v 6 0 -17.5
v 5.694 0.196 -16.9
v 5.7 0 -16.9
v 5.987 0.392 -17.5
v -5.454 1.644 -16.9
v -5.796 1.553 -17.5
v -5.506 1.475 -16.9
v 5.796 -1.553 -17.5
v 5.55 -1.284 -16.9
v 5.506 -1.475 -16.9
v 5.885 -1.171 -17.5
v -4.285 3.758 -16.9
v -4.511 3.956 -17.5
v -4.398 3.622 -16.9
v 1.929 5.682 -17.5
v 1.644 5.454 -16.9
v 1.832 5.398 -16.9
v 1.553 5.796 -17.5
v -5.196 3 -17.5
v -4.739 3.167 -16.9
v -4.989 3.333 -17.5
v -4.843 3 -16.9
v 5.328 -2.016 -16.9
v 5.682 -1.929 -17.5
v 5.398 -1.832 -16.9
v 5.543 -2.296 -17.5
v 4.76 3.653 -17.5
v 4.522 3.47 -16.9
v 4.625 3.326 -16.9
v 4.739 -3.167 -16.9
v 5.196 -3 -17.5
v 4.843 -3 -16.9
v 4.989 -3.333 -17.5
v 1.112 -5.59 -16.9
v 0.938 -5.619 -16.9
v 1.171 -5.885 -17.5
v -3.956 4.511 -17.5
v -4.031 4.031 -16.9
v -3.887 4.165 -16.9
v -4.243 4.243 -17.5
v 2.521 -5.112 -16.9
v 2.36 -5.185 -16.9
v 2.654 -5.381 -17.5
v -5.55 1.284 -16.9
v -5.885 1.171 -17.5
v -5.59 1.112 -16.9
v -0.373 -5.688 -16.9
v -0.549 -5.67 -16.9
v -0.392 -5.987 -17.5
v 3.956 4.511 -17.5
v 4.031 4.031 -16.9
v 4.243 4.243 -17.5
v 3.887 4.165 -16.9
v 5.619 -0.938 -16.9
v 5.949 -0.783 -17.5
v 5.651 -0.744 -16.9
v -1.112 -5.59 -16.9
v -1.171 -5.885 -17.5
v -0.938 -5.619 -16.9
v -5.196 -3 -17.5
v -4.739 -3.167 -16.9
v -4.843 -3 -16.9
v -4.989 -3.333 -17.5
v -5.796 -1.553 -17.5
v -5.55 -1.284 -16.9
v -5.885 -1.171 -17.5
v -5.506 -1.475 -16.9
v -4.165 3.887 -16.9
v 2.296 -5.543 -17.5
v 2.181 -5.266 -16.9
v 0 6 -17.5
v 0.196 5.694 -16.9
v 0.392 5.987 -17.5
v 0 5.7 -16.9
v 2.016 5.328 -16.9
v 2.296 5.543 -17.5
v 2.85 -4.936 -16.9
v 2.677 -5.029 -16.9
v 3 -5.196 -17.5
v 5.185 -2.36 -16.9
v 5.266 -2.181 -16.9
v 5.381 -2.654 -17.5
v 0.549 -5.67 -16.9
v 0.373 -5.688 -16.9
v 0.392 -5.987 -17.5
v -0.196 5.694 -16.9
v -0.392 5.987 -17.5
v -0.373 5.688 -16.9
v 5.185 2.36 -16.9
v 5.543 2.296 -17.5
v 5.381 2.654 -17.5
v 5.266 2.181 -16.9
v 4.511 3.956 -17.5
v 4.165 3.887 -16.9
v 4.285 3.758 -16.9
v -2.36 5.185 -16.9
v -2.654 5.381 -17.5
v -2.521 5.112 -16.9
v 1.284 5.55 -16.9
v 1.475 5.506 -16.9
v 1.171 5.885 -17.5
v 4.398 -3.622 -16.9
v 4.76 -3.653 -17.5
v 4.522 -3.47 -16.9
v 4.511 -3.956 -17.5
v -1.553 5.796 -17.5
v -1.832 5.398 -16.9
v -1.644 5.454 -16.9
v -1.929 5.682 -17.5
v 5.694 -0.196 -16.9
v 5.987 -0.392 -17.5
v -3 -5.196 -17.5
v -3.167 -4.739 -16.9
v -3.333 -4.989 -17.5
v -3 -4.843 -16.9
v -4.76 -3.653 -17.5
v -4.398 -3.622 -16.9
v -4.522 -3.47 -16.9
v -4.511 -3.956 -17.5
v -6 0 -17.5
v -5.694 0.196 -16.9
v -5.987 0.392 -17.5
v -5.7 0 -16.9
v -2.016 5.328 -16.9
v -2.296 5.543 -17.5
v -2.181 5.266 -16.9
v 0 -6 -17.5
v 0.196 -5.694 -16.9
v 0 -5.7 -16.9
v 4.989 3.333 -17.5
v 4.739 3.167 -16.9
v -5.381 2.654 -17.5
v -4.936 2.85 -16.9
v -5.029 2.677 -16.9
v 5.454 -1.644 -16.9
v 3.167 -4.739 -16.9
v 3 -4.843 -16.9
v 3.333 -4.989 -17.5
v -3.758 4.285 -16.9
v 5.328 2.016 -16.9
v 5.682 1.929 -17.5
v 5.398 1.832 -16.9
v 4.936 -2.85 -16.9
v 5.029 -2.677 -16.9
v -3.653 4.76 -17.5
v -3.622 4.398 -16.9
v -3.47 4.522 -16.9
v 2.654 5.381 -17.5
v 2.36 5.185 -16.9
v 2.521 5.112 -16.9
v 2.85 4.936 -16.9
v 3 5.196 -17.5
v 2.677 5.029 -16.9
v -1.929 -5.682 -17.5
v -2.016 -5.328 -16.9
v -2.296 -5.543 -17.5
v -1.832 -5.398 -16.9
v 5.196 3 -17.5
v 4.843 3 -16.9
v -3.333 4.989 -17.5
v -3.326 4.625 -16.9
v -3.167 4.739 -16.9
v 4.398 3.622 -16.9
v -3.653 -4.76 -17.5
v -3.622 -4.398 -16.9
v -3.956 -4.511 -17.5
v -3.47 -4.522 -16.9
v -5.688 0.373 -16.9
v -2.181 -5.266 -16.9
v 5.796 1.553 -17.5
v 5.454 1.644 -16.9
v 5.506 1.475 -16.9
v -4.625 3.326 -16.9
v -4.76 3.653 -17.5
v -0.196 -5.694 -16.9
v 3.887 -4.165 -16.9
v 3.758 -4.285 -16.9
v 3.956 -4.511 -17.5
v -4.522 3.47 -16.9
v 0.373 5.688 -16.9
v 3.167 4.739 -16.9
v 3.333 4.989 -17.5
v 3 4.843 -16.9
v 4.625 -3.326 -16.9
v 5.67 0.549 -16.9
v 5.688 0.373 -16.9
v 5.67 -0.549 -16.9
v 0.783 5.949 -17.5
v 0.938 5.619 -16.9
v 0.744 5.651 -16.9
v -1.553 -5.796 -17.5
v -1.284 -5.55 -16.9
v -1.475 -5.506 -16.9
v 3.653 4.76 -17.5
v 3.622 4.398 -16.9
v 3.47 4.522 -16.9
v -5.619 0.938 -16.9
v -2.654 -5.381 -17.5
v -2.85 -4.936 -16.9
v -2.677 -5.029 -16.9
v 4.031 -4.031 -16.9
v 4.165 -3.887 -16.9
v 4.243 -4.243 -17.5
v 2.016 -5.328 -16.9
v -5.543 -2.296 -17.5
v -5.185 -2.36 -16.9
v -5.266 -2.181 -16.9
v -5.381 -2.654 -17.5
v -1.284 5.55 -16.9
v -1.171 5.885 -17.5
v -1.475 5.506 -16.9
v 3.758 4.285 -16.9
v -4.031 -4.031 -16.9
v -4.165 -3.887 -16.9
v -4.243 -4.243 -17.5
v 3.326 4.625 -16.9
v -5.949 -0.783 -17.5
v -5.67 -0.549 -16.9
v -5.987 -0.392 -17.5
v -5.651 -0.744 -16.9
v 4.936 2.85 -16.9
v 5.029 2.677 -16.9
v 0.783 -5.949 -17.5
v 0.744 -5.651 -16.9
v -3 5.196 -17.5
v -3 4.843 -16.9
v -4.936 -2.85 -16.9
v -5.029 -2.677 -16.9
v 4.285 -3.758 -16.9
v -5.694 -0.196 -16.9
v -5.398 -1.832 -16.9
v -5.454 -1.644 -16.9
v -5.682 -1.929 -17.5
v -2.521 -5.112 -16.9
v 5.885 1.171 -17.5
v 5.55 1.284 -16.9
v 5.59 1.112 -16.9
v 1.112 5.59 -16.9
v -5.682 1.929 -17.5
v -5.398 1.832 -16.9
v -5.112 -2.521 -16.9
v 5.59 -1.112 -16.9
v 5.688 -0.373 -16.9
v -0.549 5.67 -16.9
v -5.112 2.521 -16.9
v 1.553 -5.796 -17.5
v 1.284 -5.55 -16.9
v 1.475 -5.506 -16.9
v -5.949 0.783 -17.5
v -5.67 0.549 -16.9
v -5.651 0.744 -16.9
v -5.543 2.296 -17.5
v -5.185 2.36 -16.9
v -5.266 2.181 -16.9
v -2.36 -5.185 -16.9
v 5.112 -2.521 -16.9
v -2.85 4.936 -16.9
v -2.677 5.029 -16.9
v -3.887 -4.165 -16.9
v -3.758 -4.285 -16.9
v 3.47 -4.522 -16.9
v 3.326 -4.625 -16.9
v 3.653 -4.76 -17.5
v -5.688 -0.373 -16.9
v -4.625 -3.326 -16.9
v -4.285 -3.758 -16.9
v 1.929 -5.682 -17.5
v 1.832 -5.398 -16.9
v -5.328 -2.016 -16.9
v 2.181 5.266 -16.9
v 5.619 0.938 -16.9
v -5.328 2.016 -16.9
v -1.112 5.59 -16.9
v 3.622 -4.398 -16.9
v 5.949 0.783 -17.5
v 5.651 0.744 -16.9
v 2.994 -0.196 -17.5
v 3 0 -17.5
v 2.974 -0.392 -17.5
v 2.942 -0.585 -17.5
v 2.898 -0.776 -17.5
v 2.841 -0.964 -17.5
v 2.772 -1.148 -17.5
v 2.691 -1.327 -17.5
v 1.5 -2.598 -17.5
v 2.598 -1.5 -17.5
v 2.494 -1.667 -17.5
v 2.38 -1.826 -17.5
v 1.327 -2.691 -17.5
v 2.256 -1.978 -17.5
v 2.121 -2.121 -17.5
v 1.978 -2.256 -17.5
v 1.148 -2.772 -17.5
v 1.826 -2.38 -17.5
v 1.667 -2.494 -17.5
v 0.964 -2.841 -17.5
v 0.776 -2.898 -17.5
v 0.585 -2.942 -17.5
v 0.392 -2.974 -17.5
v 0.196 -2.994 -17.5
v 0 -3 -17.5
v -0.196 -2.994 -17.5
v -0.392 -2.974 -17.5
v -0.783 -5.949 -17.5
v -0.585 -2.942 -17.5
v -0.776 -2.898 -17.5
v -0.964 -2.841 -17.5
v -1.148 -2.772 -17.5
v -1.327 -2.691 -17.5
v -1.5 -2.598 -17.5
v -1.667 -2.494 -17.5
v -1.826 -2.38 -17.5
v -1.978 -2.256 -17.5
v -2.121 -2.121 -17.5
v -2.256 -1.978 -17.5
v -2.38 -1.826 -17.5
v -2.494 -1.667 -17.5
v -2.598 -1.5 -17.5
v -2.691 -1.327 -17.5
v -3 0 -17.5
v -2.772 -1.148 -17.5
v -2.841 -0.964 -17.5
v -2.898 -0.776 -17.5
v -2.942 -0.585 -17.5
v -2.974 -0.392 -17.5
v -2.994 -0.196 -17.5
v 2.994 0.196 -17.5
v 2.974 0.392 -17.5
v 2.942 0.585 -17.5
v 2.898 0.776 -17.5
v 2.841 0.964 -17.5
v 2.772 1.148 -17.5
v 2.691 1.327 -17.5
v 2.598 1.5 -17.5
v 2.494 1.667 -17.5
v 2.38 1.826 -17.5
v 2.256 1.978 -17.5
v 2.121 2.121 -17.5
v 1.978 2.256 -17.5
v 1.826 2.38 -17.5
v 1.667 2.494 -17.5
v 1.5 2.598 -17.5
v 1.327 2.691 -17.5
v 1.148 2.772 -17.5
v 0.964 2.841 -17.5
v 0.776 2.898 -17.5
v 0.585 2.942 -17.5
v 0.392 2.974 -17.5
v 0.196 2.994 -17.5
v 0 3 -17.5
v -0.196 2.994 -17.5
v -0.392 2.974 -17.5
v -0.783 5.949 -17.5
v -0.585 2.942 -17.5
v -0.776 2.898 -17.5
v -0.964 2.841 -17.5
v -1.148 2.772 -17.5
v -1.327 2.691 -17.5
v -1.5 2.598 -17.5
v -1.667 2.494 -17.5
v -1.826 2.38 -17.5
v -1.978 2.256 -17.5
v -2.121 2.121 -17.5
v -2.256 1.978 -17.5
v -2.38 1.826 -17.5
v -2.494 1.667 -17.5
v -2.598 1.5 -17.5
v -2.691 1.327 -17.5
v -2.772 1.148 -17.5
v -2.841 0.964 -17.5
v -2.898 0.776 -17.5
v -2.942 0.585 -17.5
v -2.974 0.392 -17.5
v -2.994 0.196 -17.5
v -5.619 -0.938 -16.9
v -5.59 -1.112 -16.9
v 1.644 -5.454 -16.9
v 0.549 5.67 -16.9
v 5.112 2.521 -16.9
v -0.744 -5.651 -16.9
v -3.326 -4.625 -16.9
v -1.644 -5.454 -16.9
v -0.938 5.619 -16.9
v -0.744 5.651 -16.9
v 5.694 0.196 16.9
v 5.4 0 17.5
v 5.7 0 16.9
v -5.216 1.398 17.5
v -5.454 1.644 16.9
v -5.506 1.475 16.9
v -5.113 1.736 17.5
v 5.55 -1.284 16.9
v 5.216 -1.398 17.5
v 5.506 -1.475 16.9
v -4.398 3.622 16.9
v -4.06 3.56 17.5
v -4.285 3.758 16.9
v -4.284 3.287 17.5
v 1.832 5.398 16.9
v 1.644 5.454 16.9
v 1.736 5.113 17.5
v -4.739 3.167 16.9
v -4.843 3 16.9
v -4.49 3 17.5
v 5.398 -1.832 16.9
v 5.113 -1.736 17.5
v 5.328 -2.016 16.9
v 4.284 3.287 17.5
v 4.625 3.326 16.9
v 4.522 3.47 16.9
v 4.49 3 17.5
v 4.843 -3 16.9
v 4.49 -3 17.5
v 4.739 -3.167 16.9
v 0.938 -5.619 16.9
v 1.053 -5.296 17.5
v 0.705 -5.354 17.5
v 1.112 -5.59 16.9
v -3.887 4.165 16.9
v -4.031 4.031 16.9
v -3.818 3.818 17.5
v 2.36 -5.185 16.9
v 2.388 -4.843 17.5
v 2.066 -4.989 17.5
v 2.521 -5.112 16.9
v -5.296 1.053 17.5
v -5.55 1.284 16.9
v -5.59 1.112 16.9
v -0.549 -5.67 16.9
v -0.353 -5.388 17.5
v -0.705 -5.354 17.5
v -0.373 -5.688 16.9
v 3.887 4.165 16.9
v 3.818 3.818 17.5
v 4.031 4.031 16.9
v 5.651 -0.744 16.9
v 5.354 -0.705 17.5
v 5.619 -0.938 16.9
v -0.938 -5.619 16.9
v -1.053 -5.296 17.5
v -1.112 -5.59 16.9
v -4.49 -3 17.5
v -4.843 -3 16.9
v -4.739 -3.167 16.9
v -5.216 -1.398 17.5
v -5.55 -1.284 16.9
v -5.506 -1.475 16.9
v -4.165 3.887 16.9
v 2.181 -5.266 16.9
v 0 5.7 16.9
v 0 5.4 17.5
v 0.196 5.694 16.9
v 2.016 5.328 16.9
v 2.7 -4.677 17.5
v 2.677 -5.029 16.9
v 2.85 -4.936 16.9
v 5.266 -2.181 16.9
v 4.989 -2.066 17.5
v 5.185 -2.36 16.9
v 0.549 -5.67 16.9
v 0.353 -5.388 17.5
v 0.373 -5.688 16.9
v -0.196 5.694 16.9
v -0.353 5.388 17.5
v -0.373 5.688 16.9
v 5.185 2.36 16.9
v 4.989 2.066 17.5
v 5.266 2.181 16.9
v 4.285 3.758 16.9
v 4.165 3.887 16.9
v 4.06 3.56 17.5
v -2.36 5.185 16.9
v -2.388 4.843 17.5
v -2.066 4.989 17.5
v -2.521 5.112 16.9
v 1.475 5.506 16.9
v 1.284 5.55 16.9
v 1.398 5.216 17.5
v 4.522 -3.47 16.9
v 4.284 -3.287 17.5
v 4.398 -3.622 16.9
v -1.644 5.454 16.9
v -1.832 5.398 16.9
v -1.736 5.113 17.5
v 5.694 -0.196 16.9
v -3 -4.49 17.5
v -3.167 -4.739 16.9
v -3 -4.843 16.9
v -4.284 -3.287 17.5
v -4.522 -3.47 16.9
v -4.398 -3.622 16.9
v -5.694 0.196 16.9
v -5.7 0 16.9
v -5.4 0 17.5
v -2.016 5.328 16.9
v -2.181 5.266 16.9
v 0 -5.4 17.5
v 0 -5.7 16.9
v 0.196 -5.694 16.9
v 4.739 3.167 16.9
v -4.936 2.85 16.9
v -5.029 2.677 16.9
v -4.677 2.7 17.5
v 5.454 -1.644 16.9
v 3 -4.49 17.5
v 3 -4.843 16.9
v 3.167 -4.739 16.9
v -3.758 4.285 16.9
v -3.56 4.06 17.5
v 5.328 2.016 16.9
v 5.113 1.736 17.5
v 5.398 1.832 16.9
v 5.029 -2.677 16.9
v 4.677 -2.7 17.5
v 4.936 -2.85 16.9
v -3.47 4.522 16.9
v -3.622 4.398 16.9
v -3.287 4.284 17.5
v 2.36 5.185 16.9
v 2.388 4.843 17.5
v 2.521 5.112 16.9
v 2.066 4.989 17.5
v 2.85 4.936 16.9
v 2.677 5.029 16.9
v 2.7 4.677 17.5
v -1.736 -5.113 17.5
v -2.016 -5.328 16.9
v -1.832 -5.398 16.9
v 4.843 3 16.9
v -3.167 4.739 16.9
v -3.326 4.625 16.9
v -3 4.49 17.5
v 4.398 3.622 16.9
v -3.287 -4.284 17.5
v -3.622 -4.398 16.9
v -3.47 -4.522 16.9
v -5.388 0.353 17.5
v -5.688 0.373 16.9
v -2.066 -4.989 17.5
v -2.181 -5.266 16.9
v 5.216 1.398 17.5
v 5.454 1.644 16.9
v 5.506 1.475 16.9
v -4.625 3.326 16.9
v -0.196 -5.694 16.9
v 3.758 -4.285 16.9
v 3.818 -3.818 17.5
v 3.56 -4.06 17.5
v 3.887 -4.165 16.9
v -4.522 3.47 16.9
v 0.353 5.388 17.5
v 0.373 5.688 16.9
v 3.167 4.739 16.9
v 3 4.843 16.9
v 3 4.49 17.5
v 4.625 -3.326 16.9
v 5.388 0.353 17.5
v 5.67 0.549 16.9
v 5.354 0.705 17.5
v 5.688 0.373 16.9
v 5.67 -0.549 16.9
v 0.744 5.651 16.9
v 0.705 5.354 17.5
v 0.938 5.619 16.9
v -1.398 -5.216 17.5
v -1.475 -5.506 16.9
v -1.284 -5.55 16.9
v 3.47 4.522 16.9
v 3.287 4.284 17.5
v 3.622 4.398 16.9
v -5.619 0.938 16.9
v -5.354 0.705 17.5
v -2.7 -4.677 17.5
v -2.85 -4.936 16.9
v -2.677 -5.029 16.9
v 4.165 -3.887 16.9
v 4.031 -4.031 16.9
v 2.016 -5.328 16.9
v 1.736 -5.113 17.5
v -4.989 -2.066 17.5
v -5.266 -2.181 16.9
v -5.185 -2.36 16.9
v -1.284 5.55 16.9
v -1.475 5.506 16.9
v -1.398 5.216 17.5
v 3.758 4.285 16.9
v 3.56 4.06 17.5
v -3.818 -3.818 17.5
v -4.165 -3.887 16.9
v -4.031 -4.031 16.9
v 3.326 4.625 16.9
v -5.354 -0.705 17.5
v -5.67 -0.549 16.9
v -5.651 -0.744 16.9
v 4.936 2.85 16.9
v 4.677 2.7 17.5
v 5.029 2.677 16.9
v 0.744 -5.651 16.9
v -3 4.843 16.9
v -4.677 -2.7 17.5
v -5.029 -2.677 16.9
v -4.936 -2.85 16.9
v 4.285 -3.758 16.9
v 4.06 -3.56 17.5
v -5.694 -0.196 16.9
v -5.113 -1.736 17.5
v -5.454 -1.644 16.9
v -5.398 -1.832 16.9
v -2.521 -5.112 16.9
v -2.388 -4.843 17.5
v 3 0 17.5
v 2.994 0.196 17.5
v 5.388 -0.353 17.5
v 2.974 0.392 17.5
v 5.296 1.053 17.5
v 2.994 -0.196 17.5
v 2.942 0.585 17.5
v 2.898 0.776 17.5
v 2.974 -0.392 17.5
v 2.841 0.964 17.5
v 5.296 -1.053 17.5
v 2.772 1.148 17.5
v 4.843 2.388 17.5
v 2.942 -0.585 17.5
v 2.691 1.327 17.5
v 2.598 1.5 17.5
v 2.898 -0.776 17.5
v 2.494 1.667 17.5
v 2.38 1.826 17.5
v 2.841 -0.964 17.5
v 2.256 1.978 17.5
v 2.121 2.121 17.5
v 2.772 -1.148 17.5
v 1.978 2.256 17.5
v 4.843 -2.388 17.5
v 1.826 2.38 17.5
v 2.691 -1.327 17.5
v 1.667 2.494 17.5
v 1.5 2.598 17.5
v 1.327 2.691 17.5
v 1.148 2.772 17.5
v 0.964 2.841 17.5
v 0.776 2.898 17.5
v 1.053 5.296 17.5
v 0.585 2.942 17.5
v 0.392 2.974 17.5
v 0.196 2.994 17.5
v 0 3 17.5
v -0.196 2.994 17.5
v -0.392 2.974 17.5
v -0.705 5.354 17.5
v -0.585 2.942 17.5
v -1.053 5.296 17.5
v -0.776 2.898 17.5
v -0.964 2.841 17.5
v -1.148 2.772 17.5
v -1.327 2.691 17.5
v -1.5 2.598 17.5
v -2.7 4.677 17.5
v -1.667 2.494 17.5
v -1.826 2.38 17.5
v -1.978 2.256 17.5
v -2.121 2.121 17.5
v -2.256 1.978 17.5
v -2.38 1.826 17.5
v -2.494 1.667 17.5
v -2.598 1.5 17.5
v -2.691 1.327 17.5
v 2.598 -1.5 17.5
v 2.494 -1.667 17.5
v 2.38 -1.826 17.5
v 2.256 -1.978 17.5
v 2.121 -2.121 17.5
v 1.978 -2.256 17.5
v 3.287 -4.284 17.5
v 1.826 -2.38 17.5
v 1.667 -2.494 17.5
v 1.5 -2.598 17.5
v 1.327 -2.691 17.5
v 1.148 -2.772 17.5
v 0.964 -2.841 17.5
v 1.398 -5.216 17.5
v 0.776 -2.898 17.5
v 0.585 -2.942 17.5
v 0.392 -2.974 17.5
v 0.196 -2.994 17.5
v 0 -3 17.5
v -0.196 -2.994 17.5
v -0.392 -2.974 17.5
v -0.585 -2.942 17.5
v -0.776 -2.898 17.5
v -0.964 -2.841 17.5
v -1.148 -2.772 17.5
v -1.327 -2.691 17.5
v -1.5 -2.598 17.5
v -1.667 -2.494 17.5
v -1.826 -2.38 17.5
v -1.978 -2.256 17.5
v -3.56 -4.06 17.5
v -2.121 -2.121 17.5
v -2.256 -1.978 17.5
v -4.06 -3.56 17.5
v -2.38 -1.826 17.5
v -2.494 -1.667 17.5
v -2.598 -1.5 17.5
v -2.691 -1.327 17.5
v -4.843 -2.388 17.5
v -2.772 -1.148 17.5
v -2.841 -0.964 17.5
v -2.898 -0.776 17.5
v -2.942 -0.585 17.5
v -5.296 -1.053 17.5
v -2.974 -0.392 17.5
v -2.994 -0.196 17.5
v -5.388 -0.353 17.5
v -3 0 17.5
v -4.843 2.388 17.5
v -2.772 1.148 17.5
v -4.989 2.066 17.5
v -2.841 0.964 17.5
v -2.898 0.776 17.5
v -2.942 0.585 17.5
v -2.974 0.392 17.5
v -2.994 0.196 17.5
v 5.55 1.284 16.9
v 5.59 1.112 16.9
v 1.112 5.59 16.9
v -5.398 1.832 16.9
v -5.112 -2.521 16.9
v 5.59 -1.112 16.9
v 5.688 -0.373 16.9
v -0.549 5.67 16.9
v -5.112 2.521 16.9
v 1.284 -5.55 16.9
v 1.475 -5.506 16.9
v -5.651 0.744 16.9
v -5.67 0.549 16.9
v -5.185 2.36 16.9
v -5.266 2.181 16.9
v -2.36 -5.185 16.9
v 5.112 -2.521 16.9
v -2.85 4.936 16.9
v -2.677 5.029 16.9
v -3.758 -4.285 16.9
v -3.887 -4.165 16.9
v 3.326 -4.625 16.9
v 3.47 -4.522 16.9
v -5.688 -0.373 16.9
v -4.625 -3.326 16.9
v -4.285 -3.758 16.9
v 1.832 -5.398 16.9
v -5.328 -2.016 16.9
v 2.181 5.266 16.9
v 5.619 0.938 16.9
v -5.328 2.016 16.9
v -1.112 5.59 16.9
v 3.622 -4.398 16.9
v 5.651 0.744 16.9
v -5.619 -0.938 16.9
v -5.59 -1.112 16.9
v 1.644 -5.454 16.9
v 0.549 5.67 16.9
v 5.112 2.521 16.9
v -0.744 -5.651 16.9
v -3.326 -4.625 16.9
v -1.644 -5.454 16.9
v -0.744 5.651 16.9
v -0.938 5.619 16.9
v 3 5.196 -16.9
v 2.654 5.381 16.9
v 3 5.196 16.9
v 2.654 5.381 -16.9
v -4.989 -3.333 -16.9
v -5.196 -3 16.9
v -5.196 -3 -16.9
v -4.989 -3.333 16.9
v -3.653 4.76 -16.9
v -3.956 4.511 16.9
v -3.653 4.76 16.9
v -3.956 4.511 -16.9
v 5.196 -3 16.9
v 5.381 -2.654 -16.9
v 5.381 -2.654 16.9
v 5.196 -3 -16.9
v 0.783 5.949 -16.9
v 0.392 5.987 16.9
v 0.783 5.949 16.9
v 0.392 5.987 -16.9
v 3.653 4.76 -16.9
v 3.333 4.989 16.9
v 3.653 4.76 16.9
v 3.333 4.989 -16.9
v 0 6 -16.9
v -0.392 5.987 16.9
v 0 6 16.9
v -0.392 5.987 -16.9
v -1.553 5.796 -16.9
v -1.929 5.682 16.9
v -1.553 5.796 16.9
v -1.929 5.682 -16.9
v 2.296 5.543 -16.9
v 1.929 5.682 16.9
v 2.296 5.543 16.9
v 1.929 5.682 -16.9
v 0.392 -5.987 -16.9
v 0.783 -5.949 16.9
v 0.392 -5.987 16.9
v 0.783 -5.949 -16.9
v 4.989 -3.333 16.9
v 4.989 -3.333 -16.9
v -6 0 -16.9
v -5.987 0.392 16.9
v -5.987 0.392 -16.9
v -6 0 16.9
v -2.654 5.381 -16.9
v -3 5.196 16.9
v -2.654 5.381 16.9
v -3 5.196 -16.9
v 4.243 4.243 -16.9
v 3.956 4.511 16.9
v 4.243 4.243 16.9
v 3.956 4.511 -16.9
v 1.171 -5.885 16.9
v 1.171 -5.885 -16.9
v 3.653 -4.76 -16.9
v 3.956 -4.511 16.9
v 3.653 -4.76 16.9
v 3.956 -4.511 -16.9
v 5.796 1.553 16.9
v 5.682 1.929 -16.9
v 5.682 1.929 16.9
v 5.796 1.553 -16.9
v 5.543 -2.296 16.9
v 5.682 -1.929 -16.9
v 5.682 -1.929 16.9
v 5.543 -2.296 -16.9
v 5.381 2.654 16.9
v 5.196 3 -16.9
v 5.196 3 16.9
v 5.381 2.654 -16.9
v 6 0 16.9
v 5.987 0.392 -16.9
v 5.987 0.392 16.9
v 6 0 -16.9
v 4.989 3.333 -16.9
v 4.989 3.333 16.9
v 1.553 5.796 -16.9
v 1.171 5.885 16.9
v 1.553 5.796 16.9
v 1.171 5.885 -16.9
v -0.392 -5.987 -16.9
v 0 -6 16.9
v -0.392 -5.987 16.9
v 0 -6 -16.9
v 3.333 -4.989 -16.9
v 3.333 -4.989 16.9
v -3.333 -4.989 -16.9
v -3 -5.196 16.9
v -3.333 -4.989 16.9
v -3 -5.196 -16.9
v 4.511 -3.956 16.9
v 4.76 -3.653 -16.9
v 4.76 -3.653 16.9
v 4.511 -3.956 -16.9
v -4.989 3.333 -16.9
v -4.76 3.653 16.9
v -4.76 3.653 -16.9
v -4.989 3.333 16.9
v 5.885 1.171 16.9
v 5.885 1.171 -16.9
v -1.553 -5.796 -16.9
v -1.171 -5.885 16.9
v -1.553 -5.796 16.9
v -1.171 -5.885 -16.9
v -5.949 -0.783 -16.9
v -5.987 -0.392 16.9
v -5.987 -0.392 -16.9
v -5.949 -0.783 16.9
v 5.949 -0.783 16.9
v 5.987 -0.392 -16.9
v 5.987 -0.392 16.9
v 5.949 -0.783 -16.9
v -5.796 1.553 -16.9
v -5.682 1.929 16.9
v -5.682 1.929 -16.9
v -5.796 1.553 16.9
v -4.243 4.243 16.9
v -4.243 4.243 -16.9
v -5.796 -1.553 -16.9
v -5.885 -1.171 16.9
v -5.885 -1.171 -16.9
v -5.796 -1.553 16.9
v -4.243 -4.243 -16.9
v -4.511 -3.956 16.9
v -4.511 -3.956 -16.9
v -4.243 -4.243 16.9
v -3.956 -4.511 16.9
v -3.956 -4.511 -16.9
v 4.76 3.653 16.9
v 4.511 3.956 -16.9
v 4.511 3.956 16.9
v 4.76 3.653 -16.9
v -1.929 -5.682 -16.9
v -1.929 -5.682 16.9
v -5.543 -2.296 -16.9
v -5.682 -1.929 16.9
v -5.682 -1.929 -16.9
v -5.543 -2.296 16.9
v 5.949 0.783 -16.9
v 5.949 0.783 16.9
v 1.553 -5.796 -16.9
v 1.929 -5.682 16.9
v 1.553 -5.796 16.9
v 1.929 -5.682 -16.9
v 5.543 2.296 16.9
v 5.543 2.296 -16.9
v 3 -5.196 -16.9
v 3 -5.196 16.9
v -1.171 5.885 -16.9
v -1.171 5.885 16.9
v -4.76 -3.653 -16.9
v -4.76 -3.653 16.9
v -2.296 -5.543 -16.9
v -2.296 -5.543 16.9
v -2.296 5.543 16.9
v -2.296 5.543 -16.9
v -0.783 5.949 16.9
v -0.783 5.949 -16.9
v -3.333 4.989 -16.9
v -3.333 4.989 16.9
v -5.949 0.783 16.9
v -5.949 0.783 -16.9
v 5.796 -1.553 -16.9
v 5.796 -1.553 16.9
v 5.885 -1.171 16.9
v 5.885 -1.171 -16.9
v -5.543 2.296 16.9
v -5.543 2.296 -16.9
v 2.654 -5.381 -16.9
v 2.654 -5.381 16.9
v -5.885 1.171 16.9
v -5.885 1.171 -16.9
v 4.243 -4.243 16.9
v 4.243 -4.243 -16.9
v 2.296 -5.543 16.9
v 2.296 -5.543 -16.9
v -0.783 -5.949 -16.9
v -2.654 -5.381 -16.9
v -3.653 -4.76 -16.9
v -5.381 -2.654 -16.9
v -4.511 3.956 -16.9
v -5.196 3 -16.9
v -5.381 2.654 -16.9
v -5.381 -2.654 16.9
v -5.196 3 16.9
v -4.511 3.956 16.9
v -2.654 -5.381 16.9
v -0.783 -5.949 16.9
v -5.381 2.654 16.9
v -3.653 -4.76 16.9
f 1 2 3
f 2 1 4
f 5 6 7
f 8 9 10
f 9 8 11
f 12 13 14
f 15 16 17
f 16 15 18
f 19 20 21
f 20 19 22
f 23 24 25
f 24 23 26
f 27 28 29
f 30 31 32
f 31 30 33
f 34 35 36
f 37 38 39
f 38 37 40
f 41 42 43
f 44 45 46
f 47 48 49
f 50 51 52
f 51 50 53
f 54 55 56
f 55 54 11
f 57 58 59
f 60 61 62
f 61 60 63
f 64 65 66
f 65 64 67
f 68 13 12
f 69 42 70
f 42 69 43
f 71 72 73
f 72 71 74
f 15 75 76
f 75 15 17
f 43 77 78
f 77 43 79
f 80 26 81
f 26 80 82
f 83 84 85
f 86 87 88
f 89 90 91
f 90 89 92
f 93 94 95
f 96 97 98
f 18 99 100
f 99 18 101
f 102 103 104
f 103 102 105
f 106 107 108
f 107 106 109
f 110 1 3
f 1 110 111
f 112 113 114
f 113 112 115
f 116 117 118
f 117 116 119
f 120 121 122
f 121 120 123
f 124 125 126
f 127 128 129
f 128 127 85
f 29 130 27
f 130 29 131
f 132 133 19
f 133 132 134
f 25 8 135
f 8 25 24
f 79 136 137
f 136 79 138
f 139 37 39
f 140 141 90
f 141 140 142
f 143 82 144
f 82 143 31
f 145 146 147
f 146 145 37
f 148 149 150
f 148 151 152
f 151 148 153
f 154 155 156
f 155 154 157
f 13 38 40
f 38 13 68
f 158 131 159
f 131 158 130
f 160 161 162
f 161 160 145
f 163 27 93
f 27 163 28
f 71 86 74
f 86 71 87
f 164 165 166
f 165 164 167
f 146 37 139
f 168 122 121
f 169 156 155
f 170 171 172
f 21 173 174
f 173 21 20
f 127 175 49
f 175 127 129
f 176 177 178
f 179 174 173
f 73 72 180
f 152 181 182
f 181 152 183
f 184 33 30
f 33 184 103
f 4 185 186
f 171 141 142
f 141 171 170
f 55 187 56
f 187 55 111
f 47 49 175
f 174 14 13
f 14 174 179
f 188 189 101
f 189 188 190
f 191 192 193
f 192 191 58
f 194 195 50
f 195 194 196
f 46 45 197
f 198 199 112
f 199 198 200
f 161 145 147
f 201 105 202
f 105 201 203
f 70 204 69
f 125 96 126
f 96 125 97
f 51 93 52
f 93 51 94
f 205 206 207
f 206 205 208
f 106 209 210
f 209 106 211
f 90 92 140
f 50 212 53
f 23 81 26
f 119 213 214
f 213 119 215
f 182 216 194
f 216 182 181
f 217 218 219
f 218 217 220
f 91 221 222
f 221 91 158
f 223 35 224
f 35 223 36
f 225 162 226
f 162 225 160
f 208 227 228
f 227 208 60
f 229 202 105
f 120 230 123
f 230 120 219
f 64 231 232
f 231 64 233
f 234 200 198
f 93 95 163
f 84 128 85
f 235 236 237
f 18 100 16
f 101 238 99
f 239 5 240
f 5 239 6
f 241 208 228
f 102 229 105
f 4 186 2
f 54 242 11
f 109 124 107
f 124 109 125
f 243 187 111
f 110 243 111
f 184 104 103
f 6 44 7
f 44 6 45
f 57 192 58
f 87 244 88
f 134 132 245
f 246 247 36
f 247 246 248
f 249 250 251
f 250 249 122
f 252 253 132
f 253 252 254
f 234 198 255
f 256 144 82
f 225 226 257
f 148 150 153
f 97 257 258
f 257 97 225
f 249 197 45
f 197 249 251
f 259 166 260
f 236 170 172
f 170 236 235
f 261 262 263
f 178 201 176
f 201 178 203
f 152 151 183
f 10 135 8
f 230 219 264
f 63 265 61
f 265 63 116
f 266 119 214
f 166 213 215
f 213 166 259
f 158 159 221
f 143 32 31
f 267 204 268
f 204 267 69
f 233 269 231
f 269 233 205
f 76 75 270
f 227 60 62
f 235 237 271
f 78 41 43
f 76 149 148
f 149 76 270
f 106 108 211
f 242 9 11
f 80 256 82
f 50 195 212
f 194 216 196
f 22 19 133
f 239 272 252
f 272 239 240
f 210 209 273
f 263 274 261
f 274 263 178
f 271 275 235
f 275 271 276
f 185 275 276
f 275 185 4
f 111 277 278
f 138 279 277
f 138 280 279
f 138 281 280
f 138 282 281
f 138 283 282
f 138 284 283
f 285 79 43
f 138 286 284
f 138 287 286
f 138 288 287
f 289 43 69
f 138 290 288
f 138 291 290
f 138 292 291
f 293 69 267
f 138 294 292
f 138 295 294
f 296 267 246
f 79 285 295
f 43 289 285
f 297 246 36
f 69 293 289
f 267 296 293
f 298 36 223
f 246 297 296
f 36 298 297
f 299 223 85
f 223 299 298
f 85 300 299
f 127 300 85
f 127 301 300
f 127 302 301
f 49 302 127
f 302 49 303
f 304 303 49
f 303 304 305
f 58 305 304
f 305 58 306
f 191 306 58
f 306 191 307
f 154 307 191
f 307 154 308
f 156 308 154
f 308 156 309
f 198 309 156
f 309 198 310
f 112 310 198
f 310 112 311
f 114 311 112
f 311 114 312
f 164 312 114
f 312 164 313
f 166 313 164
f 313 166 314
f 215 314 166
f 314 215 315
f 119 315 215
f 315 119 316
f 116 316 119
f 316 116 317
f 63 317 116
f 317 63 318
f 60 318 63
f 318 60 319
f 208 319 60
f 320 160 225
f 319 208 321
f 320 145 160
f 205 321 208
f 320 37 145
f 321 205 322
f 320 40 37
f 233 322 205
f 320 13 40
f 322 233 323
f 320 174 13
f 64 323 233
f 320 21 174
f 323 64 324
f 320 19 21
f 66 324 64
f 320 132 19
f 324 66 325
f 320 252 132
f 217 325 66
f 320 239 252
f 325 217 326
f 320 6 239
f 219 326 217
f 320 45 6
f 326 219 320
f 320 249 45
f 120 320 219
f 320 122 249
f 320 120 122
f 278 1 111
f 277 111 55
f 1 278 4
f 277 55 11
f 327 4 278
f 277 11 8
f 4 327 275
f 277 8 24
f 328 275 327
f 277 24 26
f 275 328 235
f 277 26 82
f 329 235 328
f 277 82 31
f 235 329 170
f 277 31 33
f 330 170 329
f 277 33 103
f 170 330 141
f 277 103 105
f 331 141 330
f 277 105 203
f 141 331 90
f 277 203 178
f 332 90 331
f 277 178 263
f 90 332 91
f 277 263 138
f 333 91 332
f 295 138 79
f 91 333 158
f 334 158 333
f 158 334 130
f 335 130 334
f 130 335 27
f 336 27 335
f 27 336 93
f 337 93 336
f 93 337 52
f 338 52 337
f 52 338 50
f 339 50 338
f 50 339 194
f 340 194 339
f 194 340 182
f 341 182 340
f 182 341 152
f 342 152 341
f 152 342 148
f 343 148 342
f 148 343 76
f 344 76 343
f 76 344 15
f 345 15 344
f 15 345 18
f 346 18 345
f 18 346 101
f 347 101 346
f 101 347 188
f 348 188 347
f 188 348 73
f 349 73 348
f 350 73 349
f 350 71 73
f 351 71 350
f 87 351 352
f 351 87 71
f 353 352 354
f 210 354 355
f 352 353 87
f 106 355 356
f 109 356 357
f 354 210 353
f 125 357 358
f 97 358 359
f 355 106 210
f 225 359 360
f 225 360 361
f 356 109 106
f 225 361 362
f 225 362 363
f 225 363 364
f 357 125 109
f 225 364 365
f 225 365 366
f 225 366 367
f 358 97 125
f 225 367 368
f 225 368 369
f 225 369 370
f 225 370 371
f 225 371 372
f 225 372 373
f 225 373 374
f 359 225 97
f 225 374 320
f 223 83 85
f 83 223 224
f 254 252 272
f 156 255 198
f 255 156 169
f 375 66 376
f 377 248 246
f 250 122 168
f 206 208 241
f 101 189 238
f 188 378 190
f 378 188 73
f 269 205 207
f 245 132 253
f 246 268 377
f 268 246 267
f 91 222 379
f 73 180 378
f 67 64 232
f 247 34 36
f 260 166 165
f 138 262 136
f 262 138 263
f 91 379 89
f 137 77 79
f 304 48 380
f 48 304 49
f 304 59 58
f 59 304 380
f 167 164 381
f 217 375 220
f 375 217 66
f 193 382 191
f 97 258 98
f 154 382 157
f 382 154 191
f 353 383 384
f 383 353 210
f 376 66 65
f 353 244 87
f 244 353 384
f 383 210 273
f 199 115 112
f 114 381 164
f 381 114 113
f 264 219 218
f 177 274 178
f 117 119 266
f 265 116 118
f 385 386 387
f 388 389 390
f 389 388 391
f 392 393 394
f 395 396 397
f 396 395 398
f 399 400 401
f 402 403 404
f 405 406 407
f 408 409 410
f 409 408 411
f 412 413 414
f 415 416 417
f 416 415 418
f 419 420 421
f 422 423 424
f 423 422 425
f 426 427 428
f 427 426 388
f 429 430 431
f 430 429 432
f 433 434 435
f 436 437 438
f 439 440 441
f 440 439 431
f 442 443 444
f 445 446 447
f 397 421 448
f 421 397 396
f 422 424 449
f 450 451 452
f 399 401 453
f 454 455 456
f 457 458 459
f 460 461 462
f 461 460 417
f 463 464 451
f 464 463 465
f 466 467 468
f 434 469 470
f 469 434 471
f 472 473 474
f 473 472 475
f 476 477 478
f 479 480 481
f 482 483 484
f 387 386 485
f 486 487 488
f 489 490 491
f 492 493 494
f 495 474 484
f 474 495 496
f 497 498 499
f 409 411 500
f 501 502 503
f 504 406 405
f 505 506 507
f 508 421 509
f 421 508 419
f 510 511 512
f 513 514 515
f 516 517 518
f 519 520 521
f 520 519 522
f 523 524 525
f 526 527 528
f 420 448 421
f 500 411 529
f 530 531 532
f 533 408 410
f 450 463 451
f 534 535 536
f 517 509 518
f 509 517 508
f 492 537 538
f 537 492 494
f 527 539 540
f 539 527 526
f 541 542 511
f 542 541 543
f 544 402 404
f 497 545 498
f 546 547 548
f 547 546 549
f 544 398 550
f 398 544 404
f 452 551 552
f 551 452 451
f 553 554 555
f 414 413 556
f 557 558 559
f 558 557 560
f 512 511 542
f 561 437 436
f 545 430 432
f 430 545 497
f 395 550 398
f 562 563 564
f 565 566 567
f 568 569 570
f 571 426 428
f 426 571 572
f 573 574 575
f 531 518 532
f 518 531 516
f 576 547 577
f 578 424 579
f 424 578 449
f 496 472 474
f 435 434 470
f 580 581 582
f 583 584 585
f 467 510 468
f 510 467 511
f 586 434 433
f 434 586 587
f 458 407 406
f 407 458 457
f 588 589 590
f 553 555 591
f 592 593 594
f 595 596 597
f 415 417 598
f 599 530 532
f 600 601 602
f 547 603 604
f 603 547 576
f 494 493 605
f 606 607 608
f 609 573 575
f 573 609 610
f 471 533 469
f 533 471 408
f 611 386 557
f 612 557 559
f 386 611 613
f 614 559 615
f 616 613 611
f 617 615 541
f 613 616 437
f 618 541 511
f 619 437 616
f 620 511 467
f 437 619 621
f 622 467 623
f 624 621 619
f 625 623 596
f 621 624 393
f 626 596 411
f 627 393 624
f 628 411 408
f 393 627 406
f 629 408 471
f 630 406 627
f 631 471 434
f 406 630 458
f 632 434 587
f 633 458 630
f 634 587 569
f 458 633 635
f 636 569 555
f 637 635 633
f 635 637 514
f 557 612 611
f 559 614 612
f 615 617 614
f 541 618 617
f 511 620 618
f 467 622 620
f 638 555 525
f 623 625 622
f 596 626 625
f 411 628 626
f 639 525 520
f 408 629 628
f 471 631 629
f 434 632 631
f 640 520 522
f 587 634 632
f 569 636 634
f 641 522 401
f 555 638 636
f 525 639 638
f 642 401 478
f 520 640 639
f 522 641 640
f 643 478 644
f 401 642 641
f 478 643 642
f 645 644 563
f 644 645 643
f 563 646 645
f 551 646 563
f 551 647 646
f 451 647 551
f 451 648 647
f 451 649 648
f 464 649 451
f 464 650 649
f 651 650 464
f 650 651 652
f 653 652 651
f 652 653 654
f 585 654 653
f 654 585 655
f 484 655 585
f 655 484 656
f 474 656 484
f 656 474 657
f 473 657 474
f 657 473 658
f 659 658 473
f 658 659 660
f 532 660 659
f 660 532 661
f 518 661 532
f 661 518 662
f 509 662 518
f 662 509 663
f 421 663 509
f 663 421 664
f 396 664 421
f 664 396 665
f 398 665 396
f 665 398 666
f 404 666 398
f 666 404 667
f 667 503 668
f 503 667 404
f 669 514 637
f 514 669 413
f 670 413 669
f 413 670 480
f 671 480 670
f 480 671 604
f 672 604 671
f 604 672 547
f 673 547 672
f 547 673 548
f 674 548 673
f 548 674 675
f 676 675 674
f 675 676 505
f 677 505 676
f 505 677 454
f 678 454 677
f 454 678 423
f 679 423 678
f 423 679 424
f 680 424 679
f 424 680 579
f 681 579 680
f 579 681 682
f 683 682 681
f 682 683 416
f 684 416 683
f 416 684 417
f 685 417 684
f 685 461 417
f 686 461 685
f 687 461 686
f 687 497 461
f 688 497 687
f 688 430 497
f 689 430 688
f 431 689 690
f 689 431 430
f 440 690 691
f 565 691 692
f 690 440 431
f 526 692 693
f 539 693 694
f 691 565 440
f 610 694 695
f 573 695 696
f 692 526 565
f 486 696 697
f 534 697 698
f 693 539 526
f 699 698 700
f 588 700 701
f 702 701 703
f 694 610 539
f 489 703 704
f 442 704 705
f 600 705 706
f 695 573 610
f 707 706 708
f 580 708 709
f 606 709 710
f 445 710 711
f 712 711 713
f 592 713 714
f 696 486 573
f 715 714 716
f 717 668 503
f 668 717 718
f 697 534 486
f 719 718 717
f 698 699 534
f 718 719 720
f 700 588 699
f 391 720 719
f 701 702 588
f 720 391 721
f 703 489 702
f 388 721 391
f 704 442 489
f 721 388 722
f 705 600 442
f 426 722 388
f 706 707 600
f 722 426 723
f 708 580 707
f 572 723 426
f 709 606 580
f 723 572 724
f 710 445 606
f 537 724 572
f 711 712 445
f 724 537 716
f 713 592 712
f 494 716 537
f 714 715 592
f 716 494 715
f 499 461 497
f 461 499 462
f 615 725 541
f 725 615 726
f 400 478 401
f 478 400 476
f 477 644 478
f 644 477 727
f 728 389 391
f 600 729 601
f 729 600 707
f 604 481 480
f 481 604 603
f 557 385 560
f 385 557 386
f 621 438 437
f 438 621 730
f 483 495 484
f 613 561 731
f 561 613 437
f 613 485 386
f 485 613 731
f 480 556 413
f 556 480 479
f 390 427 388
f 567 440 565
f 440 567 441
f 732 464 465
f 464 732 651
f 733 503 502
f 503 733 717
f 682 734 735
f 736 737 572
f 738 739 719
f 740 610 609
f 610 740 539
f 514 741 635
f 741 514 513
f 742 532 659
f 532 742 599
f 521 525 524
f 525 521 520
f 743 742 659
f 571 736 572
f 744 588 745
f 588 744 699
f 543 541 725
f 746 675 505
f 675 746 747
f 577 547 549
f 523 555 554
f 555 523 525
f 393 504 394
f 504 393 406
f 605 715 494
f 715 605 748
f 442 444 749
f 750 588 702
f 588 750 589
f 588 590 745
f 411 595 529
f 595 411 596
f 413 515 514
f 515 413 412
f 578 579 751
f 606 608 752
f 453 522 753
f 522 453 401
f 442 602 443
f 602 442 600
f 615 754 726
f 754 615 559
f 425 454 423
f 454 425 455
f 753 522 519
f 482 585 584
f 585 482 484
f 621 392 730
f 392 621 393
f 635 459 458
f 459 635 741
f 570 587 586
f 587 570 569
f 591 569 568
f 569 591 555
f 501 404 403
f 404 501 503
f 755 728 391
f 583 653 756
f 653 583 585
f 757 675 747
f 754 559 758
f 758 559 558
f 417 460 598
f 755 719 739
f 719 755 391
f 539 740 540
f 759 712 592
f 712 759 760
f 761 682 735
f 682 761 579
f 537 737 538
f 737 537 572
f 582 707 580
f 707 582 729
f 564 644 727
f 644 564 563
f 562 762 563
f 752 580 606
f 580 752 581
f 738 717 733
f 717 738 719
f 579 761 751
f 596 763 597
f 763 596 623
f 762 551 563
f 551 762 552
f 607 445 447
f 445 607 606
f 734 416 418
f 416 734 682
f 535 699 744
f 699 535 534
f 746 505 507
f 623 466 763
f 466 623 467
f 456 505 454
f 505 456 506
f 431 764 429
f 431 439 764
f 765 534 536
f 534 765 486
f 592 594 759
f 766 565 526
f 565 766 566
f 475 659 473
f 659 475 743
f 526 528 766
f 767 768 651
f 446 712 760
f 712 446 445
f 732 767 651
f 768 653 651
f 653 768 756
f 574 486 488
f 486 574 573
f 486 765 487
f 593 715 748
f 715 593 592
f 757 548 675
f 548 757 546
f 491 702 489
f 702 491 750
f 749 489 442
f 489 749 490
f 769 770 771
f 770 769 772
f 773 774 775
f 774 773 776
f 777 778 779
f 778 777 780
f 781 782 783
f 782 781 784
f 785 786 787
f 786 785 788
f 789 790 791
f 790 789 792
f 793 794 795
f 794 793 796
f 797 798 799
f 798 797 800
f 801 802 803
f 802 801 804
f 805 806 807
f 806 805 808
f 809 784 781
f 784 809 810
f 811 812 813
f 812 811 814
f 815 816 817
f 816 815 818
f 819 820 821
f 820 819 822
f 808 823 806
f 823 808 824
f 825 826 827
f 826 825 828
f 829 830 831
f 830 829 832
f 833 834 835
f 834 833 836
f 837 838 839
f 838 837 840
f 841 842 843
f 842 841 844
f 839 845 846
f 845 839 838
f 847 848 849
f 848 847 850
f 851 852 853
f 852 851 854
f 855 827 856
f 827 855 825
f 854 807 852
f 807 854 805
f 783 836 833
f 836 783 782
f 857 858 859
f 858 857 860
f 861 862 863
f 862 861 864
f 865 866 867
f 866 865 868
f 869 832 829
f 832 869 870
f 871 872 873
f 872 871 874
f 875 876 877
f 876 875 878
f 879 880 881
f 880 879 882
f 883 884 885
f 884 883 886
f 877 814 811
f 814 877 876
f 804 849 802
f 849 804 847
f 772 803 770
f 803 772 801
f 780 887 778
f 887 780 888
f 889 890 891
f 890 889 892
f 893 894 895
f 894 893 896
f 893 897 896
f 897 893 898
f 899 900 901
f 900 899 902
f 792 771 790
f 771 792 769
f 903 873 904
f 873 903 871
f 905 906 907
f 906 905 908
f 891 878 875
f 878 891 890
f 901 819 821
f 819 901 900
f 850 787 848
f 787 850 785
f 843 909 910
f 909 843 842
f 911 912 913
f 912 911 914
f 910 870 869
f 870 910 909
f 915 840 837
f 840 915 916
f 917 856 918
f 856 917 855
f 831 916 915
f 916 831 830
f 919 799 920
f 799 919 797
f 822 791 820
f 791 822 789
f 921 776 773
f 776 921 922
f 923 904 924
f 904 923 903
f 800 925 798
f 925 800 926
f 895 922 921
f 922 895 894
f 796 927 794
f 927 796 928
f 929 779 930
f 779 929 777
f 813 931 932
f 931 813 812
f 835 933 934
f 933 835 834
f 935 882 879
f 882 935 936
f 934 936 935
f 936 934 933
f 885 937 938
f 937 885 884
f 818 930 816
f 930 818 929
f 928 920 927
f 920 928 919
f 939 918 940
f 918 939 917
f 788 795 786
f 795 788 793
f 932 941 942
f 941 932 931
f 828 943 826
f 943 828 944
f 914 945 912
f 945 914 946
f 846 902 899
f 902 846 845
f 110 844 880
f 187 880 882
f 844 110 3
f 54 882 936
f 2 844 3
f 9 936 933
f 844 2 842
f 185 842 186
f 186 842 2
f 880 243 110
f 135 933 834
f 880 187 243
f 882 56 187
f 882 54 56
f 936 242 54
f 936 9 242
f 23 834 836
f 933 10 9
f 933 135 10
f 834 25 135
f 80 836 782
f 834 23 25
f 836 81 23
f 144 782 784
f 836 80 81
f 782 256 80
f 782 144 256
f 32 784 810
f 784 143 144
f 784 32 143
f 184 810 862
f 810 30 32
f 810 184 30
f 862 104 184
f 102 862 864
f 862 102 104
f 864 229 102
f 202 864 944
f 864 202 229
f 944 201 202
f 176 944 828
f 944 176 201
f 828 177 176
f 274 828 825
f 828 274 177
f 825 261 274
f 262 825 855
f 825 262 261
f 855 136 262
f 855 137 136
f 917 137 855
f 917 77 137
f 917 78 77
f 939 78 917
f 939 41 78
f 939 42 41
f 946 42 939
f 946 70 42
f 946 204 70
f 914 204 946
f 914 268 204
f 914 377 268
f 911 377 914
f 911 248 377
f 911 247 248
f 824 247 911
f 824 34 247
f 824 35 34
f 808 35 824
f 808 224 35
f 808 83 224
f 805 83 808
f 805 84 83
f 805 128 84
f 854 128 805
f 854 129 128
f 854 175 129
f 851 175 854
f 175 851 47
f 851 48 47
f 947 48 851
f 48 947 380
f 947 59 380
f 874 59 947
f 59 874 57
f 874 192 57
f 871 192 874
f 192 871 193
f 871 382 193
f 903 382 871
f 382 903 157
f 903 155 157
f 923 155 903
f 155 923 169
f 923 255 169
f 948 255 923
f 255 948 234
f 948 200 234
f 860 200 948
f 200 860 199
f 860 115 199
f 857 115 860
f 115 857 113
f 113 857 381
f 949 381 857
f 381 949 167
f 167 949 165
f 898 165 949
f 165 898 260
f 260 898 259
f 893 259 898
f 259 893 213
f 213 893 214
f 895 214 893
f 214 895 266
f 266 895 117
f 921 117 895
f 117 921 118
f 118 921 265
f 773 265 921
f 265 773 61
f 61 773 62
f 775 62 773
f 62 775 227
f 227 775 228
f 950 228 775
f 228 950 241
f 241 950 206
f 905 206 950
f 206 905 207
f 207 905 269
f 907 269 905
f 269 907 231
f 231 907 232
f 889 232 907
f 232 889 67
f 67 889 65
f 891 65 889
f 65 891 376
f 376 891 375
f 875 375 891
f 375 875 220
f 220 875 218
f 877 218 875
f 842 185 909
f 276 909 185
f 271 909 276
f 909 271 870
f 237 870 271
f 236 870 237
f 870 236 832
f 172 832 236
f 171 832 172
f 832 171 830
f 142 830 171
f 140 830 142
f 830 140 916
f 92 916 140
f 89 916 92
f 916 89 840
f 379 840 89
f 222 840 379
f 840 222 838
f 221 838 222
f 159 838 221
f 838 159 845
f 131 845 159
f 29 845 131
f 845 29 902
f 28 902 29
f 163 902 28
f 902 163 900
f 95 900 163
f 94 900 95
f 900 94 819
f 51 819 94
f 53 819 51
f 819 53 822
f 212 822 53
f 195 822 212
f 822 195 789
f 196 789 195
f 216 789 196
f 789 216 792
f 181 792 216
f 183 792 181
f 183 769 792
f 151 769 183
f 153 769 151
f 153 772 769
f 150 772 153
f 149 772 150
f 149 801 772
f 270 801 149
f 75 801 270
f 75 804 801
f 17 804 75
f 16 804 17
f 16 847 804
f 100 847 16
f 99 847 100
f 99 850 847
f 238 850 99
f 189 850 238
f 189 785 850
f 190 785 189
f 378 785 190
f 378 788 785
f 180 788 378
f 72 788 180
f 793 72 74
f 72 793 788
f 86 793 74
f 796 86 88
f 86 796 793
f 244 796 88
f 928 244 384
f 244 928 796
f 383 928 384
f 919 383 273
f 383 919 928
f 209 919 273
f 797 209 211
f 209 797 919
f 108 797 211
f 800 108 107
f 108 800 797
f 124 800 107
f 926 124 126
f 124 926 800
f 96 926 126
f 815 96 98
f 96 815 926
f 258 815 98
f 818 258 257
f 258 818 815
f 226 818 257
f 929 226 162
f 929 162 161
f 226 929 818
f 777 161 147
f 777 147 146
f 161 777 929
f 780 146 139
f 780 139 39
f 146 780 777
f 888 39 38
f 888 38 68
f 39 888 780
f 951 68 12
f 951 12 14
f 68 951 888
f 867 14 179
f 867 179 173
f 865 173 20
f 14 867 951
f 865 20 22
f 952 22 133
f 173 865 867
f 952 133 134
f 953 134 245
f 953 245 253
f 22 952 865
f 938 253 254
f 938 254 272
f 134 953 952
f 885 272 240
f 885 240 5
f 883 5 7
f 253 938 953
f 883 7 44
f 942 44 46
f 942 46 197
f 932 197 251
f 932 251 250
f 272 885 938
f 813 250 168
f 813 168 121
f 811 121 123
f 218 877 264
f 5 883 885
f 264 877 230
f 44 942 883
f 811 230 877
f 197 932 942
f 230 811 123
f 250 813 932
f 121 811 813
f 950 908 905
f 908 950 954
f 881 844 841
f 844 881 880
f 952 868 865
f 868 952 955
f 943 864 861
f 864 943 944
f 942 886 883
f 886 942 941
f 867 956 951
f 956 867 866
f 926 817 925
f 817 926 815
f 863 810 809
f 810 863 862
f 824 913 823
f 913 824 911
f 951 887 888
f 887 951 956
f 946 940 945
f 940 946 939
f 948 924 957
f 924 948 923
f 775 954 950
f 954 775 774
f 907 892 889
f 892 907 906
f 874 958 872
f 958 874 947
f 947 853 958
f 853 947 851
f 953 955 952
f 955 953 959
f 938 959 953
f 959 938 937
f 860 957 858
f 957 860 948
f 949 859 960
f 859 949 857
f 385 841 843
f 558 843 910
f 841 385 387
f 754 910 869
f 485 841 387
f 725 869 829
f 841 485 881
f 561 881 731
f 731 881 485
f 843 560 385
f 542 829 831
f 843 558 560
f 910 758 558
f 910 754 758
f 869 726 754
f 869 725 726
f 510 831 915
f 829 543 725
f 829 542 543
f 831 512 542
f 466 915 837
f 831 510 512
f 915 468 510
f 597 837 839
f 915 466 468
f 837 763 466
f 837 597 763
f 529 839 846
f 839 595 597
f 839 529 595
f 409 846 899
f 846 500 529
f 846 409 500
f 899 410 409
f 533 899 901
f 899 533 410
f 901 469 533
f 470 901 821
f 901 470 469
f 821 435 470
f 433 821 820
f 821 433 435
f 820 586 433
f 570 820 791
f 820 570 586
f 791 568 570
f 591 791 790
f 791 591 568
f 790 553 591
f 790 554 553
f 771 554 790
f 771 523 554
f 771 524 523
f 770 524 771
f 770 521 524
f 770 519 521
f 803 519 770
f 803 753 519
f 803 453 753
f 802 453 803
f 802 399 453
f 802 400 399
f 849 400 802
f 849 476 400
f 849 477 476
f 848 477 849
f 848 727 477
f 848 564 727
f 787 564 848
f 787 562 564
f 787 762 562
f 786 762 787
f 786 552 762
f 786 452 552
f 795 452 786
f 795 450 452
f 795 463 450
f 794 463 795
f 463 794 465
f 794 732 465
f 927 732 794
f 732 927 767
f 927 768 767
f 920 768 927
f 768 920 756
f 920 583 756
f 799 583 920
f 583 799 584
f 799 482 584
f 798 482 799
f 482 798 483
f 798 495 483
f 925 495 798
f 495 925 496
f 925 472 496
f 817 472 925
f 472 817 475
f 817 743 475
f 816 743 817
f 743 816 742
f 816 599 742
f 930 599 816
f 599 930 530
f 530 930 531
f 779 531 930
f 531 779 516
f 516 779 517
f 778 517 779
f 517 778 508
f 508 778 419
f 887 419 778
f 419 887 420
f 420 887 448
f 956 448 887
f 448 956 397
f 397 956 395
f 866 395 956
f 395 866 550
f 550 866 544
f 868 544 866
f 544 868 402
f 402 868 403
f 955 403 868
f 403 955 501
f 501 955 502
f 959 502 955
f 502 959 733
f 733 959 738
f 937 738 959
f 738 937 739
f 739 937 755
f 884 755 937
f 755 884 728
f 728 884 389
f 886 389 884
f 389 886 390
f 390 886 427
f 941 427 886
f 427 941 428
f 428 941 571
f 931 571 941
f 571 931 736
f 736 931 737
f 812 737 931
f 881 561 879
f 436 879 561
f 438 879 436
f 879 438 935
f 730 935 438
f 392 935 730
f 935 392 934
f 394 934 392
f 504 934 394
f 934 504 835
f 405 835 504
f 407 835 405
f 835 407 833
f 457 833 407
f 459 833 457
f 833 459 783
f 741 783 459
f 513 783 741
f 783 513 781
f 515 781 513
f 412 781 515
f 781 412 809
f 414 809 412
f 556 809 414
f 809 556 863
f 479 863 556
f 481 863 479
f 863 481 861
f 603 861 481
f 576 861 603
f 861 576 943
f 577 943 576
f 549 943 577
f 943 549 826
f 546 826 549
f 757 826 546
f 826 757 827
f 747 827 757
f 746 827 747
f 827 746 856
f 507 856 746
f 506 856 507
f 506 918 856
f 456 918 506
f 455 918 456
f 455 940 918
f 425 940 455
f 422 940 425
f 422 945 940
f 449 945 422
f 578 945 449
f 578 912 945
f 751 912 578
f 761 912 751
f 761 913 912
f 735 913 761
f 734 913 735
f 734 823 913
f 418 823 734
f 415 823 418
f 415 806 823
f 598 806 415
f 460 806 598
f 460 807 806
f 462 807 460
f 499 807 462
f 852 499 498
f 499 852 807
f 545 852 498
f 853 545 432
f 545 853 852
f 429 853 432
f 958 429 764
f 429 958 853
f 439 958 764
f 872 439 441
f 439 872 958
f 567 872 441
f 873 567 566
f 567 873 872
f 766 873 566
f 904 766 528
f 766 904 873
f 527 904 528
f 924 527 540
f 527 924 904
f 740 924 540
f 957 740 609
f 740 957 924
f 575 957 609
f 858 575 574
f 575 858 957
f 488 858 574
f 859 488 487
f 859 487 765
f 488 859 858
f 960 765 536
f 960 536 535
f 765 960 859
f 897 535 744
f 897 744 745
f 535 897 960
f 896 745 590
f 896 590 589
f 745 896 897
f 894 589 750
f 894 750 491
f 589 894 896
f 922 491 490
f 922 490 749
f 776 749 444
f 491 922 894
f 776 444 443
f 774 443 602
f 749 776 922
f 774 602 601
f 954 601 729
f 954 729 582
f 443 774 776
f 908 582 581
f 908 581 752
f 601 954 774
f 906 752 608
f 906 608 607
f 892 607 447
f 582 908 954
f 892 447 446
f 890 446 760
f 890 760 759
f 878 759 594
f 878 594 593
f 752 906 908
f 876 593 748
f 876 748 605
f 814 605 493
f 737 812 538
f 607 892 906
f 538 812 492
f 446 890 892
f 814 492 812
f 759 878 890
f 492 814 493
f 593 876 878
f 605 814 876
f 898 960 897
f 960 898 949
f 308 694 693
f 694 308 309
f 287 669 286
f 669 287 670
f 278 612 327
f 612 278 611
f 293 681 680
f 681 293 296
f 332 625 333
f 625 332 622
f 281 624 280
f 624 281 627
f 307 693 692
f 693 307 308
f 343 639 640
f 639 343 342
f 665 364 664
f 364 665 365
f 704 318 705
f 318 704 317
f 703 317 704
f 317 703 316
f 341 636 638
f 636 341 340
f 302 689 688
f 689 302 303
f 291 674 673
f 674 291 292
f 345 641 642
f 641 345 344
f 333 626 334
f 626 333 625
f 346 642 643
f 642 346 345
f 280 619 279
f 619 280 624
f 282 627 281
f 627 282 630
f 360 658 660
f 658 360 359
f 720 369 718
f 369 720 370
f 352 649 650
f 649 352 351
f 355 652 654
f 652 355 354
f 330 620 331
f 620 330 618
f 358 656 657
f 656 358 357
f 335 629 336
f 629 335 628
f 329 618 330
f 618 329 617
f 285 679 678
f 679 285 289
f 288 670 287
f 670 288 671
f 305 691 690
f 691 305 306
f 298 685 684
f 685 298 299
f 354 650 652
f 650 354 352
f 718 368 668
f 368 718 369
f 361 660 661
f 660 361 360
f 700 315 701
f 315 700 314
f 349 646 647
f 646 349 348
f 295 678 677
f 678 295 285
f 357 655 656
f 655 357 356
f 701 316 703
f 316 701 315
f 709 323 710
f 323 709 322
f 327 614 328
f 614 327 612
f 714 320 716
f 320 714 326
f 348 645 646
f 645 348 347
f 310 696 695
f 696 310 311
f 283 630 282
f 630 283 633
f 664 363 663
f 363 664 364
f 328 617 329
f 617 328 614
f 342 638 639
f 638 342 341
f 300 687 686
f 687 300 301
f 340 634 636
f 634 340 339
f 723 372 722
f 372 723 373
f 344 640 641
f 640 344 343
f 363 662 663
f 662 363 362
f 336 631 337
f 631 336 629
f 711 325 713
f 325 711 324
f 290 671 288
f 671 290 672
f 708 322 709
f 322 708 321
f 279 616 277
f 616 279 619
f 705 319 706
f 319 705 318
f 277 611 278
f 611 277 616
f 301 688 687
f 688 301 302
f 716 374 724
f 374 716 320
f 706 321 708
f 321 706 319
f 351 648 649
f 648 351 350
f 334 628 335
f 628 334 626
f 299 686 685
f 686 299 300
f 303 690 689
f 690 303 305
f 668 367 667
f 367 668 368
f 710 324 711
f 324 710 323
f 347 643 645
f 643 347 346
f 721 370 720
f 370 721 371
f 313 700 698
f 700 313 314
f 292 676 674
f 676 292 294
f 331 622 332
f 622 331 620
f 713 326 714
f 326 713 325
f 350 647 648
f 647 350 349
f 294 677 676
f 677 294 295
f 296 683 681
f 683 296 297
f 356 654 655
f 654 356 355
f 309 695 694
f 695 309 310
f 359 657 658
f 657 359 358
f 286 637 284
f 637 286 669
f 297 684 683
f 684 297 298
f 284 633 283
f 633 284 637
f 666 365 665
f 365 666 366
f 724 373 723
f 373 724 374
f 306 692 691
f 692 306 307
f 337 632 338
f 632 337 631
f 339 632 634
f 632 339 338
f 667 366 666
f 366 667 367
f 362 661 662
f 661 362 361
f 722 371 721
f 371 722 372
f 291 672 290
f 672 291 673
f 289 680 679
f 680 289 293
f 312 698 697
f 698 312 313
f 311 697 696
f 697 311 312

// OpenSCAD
// Long linear bearing (LM6LUU-style) — single connected solid
bore_diameter_mm  = 6.0;   //[3.0:12.0:0.1]
outer_diameter_mm = 12.0;  //[6.0:24.0:0.1]
length_mm         = 35.0;  //[18.0:70.0:0.5]

eps_mm     = 0.2;  //[0.05:0.5:0.05]
overlap_mm = 0.6;  //[0.2:2.0:0.1]

$fn = 96;

module linear_bearing_long() {
    // Optional subtle end chamfers to look more like a real bearing
    chamfer_mm = min(0.6, outer_diameter_mm/10);

    difference() {
        // Outer body with small chamfers (still OD=outer_diameter_mm, L=length_mm)
        union() {
            // Main cylinder (slightly shortened to make room for chamfers)
            cylinder(d=outer_diameter_mm, h=length_mm - 2*chamfer_mm, center=true);

            // End chamfers as truncated cones, connected with overlap
            for (zsgn = [-1, 1]) {
                translate([0, 0, zsgn*((length_mm - chamfer_mm)/2 - overlap_mm/2)])
                    cylinder(d1=outer_diameter_mm, d2=outer_diameter_mm - 2*chamfer_mm,
                             h=chamfer_mm + overlap_mm, center=true);
            }
        }

        // Through bore
        cylinder(d=bore_diameter_mm, h=length_mm + 2*eps_mm, center=true);
    }
}

linear_bearing_long();
